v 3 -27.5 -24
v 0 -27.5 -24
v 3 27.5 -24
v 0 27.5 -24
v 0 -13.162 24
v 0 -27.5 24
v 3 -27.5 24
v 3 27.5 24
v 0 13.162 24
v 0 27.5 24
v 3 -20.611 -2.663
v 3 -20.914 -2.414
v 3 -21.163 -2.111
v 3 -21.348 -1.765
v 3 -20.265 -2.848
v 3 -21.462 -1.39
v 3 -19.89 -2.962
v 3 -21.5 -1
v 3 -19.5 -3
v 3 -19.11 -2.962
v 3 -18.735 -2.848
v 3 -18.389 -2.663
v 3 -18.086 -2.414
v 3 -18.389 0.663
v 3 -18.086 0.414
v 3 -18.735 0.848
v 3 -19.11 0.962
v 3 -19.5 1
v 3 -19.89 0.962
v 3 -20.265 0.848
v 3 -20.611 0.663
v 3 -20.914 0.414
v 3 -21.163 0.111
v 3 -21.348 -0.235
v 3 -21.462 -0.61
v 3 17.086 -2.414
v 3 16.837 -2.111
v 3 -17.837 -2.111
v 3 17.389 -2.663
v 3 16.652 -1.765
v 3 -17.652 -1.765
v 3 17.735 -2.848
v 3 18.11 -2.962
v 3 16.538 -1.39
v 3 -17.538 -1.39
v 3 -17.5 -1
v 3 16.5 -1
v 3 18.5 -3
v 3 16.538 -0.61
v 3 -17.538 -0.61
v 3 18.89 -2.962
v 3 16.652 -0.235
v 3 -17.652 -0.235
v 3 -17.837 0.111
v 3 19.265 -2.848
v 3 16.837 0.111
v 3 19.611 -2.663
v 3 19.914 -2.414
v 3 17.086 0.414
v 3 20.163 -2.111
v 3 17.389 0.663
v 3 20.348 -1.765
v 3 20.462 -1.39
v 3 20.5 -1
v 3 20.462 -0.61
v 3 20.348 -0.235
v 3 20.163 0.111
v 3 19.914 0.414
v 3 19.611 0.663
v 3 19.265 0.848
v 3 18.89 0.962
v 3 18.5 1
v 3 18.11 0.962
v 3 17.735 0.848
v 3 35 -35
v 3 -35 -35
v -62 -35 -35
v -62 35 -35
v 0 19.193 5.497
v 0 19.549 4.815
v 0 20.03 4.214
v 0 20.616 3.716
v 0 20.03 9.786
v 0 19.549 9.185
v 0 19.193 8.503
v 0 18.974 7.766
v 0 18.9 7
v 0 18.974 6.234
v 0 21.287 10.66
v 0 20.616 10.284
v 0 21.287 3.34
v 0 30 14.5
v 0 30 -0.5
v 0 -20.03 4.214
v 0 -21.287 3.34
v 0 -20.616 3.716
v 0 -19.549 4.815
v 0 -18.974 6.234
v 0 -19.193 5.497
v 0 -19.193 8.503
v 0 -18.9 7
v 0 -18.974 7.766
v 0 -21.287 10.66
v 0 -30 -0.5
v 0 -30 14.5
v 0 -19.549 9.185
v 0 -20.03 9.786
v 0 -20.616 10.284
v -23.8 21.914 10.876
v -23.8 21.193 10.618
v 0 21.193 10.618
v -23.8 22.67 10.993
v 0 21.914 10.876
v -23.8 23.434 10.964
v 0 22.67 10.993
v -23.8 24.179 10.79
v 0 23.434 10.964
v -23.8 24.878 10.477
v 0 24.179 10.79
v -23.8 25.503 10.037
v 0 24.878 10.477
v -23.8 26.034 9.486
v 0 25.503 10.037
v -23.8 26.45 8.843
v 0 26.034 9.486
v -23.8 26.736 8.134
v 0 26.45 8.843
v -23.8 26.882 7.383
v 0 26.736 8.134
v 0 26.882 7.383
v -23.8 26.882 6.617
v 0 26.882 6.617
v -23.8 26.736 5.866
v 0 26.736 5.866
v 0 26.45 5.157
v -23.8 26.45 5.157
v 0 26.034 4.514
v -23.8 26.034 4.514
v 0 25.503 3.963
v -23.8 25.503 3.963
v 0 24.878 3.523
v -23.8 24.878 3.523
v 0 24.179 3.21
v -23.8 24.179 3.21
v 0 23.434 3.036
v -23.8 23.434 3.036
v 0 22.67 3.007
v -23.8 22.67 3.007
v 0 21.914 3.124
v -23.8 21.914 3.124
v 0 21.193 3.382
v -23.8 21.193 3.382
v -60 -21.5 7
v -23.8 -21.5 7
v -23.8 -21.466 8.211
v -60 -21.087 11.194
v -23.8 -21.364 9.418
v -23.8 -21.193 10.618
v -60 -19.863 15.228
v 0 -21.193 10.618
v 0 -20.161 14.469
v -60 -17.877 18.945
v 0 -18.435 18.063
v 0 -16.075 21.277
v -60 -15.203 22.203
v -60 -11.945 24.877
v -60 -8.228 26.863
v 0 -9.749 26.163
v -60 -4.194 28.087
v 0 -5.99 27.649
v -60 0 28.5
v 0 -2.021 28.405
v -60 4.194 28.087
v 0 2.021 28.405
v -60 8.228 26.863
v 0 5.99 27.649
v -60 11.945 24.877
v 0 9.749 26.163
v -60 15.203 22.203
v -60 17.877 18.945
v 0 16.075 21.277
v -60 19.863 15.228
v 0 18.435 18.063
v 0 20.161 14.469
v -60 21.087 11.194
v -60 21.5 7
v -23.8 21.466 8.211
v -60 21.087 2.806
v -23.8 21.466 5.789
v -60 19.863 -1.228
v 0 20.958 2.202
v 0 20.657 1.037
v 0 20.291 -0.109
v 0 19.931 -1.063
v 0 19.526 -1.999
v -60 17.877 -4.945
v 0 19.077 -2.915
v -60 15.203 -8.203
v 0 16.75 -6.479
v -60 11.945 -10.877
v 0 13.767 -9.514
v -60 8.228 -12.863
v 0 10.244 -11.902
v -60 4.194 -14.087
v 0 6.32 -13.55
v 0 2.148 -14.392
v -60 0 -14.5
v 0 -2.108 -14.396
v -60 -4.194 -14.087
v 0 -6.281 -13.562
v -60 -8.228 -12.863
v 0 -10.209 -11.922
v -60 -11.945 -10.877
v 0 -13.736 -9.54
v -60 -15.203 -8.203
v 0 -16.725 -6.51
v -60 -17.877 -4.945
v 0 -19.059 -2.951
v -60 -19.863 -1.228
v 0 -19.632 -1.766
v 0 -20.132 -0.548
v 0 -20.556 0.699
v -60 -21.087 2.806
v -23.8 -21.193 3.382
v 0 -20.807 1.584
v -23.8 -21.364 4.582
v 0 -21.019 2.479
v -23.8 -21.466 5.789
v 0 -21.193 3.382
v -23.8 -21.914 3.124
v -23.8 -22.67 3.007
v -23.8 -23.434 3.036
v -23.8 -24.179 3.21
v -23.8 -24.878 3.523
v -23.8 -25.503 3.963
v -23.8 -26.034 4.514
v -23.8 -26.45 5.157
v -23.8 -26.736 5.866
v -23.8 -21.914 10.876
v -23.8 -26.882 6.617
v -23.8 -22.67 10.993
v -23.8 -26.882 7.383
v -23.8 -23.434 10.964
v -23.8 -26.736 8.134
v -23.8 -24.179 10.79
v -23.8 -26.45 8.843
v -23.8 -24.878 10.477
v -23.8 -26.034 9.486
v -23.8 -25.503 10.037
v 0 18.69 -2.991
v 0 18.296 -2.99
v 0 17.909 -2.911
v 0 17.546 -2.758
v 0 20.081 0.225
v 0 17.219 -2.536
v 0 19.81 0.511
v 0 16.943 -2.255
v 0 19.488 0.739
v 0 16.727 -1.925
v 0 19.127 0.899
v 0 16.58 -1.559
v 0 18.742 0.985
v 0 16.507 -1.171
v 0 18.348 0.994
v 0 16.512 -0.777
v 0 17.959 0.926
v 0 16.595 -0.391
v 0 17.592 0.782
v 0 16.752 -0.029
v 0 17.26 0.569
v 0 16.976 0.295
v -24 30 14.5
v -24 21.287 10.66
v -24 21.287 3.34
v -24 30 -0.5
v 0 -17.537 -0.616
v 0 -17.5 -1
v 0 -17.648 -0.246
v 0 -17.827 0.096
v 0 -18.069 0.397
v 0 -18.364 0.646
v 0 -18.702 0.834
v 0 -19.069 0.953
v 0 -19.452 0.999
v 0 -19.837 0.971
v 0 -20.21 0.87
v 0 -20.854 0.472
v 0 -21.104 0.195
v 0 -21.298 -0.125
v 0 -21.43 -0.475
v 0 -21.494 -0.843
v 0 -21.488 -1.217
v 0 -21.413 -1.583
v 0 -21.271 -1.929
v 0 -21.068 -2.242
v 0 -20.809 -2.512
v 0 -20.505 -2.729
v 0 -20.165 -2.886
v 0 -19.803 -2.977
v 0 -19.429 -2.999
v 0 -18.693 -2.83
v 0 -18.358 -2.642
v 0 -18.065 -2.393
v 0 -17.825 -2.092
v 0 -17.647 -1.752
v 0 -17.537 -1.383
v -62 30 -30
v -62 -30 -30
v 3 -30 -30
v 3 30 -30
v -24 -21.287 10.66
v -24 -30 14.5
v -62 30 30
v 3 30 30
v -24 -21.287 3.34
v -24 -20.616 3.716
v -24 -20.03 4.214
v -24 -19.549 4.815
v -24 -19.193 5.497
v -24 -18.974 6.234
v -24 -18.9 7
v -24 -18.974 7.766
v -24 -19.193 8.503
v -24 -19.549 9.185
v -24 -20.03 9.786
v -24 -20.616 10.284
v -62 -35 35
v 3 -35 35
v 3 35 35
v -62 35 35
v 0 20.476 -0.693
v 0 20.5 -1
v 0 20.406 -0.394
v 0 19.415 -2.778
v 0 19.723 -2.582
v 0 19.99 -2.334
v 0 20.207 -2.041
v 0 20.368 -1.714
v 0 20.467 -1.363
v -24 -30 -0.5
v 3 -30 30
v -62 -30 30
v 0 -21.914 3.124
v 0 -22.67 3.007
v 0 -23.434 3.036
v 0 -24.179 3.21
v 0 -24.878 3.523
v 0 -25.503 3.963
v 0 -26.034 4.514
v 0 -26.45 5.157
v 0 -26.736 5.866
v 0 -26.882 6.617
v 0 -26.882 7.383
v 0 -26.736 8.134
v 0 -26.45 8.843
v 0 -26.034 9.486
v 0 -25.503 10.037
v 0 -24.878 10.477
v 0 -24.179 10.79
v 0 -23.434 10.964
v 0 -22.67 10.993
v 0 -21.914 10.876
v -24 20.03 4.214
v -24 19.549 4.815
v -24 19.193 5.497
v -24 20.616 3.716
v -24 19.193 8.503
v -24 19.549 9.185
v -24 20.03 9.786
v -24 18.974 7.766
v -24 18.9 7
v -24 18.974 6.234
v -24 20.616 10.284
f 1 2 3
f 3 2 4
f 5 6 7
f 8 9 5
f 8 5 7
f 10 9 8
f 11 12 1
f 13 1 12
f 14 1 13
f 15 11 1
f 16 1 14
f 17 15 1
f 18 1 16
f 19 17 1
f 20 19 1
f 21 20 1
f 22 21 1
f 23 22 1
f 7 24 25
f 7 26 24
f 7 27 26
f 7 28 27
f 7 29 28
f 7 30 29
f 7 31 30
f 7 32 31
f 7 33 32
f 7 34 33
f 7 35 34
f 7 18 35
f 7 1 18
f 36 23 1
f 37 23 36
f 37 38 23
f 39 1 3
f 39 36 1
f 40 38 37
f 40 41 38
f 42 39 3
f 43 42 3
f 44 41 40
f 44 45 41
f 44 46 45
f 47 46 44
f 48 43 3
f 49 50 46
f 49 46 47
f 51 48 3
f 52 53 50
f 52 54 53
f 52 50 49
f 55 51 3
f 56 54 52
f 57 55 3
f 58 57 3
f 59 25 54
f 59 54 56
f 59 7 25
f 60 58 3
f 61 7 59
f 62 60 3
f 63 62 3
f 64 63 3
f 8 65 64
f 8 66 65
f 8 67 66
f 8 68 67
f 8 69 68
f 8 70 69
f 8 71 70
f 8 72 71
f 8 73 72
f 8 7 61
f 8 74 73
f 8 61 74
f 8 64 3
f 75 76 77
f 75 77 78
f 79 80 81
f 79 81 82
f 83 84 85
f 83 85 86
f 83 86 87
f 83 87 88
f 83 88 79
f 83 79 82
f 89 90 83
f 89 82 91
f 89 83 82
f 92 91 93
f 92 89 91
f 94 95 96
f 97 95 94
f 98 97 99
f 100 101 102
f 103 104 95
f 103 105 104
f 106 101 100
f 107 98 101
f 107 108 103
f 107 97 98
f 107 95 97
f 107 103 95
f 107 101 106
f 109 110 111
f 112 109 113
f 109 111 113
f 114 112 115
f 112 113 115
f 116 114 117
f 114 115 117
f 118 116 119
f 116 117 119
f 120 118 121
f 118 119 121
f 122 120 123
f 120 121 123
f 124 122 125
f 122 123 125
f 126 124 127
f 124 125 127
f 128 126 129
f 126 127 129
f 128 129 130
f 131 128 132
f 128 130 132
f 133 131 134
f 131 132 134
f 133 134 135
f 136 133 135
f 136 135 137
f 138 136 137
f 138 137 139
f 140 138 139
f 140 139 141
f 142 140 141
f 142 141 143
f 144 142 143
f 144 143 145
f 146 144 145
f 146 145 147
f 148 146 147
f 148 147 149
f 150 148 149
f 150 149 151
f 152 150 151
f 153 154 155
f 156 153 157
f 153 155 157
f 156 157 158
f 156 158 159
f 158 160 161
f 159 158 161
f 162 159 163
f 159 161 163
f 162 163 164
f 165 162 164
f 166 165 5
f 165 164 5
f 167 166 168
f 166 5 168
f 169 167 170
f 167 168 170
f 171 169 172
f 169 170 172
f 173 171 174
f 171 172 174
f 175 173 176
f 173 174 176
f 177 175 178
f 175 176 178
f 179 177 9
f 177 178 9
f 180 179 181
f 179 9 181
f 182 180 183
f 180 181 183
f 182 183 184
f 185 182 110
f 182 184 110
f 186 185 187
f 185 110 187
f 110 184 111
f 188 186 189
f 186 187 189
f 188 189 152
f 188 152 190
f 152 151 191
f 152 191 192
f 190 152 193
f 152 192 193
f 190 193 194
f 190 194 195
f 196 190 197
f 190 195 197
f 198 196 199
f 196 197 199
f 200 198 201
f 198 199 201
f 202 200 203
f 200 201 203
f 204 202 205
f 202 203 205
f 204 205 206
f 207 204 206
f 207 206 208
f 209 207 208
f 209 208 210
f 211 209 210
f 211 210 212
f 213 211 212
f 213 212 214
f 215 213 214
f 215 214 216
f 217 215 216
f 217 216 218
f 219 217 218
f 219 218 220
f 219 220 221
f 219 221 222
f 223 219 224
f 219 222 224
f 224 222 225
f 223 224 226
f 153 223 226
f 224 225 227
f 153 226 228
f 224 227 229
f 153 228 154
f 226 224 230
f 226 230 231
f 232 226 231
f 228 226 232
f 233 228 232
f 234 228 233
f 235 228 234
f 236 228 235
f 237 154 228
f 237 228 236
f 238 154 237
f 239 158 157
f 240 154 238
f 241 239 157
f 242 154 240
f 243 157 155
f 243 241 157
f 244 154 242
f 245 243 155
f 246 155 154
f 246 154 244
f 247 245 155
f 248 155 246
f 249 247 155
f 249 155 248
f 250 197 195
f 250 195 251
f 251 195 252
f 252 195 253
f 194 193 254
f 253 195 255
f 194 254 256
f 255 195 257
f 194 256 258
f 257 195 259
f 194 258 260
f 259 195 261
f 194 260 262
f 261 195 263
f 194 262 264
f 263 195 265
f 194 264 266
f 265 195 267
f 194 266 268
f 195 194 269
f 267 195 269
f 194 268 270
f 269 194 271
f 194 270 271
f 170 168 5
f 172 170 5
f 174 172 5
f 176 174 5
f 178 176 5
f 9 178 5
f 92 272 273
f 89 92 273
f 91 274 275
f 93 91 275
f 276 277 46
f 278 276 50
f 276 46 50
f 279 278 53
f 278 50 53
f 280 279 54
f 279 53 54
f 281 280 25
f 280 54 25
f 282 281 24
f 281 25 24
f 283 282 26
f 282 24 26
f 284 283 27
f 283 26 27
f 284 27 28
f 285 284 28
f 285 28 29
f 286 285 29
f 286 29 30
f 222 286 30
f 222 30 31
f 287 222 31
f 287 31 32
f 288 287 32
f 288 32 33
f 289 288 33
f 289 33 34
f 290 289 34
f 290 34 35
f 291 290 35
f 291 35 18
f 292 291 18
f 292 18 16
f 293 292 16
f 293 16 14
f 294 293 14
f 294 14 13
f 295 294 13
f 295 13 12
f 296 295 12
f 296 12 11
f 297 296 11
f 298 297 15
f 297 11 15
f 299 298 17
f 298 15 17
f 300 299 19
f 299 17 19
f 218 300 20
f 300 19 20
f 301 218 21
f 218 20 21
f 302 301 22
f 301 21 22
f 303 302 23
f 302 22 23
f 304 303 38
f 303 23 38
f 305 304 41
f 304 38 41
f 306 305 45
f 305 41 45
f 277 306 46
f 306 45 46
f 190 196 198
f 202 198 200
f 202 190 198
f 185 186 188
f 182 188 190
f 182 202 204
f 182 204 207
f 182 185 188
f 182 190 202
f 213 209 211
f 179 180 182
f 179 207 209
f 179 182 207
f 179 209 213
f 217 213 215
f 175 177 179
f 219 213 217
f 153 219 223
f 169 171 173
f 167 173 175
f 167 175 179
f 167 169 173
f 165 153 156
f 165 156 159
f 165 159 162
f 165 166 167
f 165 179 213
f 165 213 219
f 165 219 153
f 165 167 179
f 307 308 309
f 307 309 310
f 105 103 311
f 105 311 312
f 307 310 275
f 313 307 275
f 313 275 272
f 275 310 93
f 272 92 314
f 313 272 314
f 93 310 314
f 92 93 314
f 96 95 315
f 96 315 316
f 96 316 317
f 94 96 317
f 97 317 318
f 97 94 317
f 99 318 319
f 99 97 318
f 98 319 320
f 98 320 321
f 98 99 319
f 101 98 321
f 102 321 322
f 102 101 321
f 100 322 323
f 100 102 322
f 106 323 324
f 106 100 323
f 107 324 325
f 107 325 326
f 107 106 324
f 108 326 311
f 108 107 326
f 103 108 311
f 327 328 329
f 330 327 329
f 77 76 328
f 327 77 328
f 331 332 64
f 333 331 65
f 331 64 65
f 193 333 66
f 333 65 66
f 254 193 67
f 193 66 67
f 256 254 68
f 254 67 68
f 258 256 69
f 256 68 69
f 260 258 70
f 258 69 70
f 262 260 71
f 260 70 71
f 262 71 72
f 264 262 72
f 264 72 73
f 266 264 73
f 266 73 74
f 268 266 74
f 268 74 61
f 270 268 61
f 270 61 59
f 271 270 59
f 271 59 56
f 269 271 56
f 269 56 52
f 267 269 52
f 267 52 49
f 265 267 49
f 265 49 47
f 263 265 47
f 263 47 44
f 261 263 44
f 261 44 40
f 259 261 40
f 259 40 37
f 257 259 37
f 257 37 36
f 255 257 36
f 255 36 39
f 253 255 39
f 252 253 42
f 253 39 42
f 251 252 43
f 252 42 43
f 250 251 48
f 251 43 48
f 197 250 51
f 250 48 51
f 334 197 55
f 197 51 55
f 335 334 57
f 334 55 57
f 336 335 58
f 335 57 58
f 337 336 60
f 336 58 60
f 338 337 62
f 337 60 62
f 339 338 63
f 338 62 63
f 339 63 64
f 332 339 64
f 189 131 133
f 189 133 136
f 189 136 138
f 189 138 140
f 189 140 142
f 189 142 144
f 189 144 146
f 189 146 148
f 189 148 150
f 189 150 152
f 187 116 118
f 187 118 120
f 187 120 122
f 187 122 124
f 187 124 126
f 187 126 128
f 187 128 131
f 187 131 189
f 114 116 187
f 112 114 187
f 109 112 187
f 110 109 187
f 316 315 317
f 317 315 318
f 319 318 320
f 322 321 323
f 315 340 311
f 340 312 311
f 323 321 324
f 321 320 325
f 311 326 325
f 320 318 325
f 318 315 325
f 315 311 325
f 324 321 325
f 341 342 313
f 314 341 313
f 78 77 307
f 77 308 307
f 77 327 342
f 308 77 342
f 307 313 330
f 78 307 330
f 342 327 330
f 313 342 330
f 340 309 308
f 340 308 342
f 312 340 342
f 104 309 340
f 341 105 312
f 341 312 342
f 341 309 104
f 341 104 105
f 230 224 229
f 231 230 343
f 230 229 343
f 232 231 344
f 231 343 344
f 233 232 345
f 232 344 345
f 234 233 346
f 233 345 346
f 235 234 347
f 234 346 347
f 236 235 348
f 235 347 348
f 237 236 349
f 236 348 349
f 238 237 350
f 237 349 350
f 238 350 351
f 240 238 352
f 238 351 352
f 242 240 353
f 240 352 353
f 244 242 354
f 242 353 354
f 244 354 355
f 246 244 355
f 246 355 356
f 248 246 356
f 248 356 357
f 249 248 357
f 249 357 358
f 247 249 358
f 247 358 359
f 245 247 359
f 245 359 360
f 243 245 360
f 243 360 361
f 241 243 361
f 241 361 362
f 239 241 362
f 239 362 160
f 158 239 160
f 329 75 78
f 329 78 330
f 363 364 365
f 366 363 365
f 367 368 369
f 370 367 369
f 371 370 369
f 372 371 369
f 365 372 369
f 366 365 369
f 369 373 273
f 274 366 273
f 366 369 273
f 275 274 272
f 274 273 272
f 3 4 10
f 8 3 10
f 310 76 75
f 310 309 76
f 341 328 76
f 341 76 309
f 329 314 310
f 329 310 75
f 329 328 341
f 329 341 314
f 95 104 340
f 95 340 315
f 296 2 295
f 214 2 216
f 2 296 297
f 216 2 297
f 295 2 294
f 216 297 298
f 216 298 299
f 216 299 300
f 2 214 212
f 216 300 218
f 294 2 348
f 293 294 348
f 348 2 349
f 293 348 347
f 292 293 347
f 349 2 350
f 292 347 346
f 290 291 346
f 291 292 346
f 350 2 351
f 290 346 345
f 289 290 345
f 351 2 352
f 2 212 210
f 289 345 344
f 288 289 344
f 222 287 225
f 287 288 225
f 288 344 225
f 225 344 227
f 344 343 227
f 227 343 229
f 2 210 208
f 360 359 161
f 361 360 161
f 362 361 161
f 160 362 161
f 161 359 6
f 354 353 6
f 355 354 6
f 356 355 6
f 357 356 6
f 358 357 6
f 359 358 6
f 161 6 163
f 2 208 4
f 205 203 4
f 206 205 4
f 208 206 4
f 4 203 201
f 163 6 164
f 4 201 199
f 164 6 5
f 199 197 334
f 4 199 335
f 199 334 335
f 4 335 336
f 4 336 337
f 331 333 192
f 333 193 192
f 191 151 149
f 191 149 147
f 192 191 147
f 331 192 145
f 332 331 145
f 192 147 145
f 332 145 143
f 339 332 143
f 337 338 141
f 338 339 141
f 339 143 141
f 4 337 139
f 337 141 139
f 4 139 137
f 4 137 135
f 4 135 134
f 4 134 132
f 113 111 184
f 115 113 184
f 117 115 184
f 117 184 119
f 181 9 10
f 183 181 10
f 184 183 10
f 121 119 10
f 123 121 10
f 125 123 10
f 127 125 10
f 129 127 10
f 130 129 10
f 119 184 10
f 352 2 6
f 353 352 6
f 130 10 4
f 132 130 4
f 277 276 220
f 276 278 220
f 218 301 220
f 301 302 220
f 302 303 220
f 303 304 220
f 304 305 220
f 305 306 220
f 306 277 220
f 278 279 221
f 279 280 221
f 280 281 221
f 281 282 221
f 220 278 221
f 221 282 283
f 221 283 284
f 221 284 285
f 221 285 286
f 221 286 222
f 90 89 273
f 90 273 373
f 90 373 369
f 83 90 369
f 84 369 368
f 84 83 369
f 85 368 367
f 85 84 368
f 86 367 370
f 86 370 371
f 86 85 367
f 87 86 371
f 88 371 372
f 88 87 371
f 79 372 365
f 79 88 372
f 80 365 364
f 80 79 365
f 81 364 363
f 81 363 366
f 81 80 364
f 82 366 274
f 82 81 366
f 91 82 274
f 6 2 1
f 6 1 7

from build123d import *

# Parameters (mm, degrees)
F0_W      = 55
F0_H      = 48
F1_DEPTH  = 3
F2_R      = 4
F3_DEPTH  = 23.8
F4_R      = 2
F5_DEPTH  = 25
F7_R      = 21.5
F8_DEPTH  = 60
F6_W      = 70
F6_H      = 70
F6_W_2    = 60
F6_H_2    = 60
F9_DEPTH  = 65
F11_DEPTH = 24


with BuildPart() as f1:
    # F0 (on Right) → F1 (new body)
    with BuildSketch(Plane.YZ):
        Rectangle(F0_W, F0_H)
    extrude(amount=F1_DEPTH)

    # F2 (on face) → F3 (join)
    with BuildSketch(Plane(origin=(0, 0, 0), x_dir=(0, -1, 0), z_dir=(-1, 0, 0))):
        with Locations((-22.9, 7)):
            Circle(F2_R)
        with Locations((22.9, 7)):
            Circle(F2_R)
    extrude(amount=F3_DEPTH)

    # F4 (on face) → F5 (cut)
    with BuildSketch(Plane.YZ.offset(3)):
        with Locations((-19.5, -1)):
            Circle(F4_R)
        with Locations((18.5, -1)):
            Circle(F4_R)
    extrude(amount=-F5_DEPTH, mode=Mode.SUBTRACT)

    # F7 (on face) → F8 (join)
    with BuildSketch(Plane(origin=(0, 0, 0), x_dir=(0, -1, 0), z_dir=(-1, 0, 0))):
        with Locations((0, 7)):
            Circle(F7_R)
    extrude(amount=F8_DEPTH)


with BuildPart() as f9:
    # F6 (on face) → F9 (new body)
    with BuildSketch(Plane.YZ.offset(3)):
        Rectangle(F6_W, F6_H)
        Rectangle(F6_W_2, F6_H_2, mode=Mode.SUBTRACT)
    extrude(amount=-F9_DEPTH)

    # F10 (on Right) → F11 (join)
    with BuildSketch(Plane.YZ):
        with BuildLine():
            Line((-30, -0.5), (-21.2869619834, 3.3396573443))
            ThreePointArc((-21.2869619834, 3.3396573443), (-18.9, 7), (-21.2869619834, 10.6603426557))
            Line((-21.2869619834, 10.6603426557), (-30, 14.5))
            Line((-30, 14.5), (-30, -0.5))
        make_face()
        with BuildLine():
            Line((30, 14.5), (21.2869619834, 10.6603426557))
            ThreePointArc((21.2869619834, 10.6603426557), (18.9, 7), (21.2869619834, 3.3396573443))
            Line((21.2869619834, 3.3396573443), (30, -0.5))
            Line((30, -0.5), (30, 14.5))
        make_face()
    extrude(amount=-F11_DEPTH)


solid = Compound([f1.part, f9.part])
